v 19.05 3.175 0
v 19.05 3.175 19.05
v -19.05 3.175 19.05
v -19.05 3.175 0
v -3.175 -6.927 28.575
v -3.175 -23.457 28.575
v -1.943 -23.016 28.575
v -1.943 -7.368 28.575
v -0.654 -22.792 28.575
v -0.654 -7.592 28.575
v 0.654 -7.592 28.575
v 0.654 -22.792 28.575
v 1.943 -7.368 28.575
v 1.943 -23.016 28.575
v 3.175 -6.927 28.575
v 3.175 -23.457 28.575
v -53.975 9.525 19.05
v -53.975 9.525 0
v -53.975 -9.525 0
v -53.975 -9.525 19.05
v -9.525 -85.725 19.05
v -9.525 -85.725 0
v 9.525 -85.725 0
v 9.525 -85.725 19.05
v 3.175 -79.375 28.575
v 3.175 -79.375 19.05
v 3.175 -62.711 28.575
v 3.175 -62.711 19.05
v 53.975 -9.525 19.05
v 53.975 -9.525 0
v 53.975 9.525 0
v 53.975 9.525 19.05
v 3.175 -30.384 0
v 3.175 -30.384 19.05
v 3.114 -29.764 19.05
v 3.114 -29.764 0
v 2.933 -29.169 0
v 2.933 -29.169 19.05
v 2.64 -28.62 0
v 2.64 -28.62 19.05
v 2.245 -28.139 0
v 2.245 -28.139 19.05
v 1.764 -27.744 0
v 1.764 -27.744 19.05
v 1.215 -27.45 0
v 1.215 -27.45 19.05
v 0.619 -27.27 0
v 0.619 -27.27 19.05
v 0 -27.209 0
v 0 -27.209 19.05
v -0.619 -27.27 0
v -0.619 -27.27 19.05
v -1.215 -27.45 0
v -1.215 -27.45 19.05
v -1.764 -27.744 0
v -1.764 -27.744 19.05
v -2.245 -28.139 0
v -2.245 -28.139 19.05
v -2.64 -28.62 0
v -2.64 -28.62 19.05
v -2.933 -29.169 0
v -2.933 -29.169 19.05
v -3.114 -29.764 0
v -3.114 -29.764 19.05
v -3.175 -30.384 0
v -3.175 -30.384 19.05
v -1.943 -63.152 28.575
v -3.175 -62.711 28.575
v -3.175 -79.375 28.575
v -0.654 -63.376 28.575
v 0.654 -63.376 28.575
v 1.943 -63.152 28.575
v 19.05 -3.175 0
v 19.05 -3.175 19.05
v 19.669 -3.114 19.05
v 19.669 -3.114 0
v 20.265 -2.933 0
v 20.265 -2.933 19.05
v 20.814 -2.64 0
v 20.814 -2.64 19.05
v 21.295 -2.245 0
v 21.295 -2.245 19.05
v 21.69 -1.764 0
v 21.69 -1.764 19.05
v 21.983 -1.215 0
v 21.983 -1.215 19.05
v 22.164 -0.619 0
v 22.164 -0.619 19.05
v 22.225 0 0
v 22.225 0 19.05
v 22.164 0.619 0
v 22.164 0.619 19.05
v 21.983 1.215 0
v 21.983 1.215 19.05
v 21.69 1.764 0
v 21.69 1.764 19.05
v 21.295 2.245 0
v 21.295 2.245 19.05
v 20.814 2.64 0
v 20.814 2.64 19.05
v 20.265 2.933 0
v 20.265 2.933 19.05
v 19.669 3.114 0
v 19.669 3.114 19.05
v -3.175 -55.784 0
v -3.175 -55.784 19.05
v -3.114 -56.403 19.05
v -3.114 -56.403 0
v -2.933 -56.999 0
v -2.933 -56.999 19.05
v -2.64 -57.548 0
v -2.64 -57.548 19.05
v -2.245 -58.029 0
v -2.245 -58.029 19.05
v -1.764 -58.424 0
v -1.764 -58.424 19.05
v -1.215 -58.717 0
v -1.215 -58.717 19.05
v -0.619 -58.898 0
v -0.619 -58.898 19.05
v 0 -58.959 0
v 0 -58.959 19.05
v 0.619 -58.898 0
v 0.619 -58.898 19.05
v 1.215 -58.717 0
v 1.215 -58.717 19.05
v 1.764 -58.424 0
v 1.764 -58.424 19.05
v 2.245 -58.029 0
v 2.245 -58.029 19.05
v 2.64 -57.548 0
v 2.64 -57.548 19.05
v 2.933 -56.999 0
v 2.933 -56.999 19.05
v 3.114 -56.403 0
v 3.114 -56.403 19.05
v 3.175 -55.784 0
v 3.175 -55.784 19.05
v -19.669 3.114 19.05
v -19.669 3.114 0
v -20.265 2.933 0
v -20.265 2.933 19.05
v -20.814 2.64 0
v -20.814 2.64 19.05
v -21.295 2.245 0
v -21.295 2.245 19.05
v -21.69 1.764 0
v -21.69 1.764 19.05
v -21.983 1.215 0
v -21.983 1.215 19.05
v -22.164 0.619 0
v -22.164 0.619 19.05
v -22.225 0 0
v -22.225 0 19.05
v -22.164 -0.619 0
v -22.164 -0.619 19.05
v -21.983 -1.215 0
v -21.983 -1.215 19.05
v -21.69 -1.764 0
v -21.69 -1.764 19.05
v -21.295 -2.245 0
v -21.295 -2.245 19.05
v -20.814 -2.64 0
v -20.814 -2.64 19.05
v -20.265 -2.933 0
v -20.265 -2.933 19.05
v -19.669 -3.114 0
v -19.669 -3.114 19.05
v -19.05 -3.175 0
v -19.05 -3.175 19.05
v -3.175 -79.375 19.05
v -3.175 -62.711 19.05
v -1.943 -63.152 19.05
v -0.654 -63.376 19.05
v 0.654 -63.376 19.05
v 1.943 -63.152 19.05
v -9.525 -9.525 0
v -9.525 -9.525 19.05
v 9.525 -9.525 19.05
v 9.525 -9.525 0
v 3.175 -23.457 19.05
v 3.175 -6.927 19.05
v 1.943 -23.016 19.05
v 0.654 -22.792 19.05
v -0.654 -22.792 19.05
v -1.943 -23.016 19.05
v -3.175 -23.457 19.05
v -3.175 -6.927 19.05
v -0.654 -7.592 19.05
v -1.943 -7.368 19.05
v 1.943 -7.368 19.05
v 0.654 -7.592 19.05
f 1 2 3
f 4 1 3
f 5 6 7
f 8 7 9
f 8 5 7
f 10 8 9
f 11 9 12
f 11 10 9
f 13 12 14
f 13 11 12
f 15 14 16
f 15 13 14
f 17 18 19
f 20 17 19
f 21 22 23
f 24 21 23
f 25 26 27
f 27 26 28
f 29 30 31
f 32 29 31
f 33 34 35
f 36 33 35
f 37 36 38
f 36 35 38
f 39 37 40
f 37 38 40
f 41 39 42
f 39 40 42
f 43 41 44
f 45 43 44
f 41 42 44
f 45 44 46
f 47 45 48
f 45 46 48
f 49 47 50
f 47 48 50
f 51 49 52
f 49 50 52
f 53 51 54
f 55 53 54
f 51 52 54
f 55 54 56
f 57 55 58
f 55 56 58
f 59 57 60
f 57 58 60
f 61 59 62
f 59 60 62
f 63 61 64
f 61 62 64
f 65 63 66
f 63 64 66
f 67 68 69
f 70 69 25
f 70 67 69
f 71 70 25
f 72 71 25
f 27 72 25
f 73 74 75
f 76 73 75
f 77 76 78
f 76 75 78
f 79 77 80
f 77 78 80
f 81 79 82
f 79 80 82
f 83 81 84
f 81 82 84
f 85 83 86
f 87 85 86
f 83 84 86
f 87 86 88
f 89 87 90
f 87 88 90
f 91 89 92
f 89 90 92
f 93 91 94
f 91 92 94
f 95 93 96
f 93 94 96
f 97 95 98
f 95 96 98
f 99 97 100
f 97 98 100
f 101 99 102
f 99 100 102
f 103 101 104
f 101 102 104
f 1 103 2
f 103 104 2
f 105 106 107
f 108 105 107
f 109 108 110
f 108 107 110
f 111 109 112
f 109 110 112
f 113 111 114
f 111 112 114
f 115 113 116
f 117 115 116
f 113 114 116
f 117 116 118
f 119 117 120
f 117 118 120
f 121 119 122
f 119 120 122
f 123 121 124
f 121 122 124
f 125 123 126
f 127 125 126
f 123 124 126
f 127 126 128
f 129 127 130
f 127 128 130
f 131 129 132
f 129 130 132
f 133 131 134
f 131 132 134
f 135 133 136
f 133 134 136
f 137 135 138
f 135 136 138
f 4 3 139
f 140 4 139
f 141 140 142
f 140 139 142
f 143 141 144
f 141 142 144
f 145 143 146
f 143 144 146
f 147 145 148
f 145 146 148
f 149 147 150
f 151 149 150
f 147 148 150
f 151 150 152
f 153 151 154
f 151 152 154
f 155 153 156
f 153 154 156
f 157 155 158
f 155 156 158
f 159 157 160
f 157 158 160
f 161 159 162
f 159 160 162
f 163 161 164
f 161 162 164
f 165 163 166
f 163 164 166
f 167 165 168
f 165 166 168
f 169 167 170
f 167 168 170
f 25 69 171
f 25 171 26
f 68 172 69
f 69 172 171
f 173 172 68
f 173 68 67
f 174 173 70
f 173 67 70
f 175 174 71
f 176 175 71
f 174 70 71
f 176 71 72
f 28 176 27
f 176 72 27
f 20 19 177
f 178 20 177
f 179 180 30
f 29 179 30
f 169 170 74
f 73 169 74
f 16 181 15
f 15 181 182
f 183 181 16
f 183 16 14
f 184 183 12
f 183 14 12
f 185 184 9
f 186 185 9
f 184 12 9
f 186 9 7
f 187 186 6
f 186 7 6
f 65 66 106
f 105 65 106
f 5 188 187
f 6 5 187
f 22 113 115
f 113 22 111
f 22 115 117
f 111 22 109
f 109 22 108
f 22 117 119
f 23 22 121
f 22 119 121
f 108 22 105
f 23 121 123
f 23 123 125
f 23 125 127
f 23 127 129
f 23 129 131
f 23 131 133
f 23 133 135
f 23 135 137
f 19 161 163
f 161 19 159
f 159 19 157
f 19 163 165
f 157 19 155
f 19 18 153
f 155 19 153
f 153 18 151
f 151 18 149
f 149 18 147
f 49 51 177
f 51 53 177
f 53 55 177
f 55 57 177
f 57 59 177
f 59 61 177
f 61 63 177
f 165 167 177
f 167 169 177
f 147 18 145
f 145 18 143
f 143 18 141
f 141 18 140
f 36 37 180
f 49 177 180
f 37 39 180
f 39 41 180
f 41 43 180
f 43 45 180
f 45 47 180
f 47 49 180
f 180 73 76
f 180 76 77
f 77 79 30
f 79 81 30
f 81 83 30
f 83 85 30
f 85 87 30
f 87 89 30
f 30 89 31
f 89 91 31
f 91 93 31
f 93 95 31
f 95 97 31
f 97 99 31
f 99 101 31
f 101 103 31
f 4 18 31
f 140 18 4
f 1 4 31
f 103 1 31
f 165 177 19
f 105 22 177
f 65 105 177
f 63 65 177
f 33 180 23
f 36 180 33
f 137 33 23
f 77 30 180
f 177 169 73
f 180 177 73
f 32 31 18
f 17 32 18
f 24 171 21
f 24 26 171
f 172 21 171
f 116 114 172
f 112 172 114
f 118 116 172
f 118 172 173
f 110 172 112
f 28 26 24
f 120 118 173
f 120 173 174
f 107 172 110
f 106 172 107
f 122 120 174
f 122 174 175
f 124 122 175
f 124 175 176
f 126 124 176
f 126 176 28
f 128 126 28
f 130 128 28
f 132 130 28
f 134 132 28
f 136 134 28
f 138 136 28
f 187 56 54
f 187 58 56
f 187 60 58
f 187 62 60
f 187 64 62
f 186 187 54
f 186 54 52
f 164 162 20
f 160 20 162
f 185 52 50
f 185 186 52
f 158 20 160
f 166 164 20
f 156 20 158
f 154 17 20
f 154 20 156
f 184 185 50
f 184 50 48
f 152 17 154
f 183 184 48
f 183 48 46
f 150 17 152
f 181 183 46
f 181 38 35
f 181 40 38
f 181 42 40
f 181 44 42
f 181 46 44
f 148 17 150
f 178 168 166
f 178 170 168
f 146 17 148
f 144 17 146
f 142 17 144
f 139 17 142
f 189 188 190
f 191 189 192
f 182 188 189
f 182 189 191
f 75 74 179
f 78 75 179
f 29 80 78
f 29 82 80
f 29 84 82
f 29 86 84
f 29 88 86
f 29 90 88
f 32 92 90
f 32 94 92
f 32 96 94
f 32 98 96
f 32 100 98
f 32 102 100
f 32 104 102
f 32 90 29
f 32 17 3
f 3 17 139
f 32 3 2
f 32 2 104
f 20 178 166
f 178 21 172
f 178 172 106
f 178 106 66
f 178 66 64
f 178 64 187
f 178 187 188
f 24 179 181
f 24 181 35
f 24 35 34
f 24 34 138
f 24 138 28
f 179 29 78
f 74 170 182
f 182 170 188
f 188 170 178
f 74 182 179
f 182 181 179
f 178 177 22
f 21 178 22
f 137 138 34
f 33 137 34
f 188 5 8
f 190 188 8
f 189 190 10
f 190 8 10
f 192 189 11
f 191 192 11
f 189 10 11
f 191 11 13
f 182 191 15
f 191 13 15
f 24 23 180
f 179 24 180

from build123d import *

# Parameters (mm, degrees)
F1_DEPTH = 19.05
F3_DEPTH = 9.525
F5_DEPTH = 28.576
F6_R     = 7.62
F7_DEPTH = 9.525
F9_DEPTH = 9.525


with BuildPart() as f1:
    # F0 (on Top) → F1 (new body)
    with BuildSketch(Plane.XY):
        Polygon((53.975, 9.525), (0, 9.525), (-53.975, 9.525), (-53.975, -9.525), (-9.525, -9.525), (-9.525, -85.725), (0, -85.725), (9.525, -85.725), (9.525, -9.525), (53.975, -9.525), align=None)
    extrude(amount=F1_DEPTH)

    # F2 (on face) → F3 (join)
    with BuildSketch(Plane.XY.offset(19.05)):
        Polygon((47.625, 3.175), (-47.625, 3.175), (-47.625, -3.175), (-3.175, -3.175), (-3.175, -79.375), (3.175, -79.375), (3.175, -3.175), (47.625, -3.175), align=None)
    extrude(amount=F3_DEPTH)

    # F4 (on face) → F5 (cut, through all)
    with BuildSketch(Plane.XY.offset(28.575)):
        with BuildLine():
            ThreePointArc((-3.175, -55.7836379401), (0, -58.9586379401), (3.175, -55.7836379401))
            Line((3.175, -55.7836379401), (3.175, -30.3836379401))
            ThreePointArc((3.175, -30.3836379401), (0, -27.2086379401), (-3.175, -30.3836379401))
            Line((-3.175, -30.3836379401), (-3.175, -55.7836379401))
        make_face()
        with BuildLine():
            ThreePointArc((-19.05, 3.175), (-22.225, 0), (-19.05, -3.175))
            Line((-19.05, -3.175), (0, -3.175))
            Line((0, -3.175), (19.05, -3.175))
            ThreePointArc((19.05, -3.175), (22.225, 0), (19.05, 3.175))
            Line((19.05, 3.175), (0, 3.175))
            Line((0, 3.175), (-19.05, 3.175))
        make_face()
    extrude(amount=-F5_DEPTH, mode=Mode.SUBTRACT)

    # F6 (on face) → F7 (cut)
    with BuildSketch(Plane.XY.offset(28.575)):
        with BuildLine():
            ThreePointArc((-25.9770321928, -3.175), (-17.4251285142, -7.4447426184), (-11.43, 0))
            ThreePointArc((-11.43, 0), (-17.4251285142, 7.4447426184), (-25.9770321928, 3.175))
            Line((-25.9770321928, 3.175), (-19.05, 3.175))
            ThreePointArc((-19.05, 3.175), (-22.225, 0), (-19.05, -3.175))
            Line((-19.05, -3.175), (-25.9770321928, -3.175))
        make_face()
        with Locations((19.05, 0)):
            Circle(F6_R)
        with Locations((0, -30.3836379401)):
            Circle(F6_R)
        with Locations((0, -55.7836379401)):
            Circle(F6_R)
        with BuildLine():
            Line((-19.05, 3.175), (-25.9770321928, 3.175))
            ThreePointArc((-25.9770321928, 3.175), (-26.67, 0), (-25.9770321928, -3.175))
            Line((-25.9770321928, -3.175), (-19.05, -3.175))
            ThreePointArc((-19.05, -3.175), (-22.225, 0), (-19.05, 3.175))
        make_face()
        Circle(F6_R)
    extrude(amount=-F7_DEPTH, mode=Mode.SUBTRACT)

    # F8 (on face) → F9 (cut, through all)
    with BuildSketch(Plane.XY.offset(28.575)):
        with BuildLine():
            Line((-25.9770321928, 3.175), (-47.625, 3.175))
            Line((-47.625, 3.175), (-47.625, -3.175))
            Line((-47.625, -3.175), (-25.9770321928, -3.175))
            ThreePointArc((-25.9770321928, -3.175), (-26.67, 0), (-25.9770321928, 3.175))
        make_face()
        with BuildLine():
            Line((47.625, 3.175), (25.9770321928, 3.175))
            ThreePointArc((25.9770321928, 3.175), (26.67, 0), (25.9770321928, -3.175))
            Line((25.9770321928, -3.175), (47.625, -3.175))
            Line((47.625, -3.175), (47.625, 3.175))
        make_face()
    extrude(amount=-F9_DEPTH, mode=Mode.SUBTRACT)


solid = f1.part
